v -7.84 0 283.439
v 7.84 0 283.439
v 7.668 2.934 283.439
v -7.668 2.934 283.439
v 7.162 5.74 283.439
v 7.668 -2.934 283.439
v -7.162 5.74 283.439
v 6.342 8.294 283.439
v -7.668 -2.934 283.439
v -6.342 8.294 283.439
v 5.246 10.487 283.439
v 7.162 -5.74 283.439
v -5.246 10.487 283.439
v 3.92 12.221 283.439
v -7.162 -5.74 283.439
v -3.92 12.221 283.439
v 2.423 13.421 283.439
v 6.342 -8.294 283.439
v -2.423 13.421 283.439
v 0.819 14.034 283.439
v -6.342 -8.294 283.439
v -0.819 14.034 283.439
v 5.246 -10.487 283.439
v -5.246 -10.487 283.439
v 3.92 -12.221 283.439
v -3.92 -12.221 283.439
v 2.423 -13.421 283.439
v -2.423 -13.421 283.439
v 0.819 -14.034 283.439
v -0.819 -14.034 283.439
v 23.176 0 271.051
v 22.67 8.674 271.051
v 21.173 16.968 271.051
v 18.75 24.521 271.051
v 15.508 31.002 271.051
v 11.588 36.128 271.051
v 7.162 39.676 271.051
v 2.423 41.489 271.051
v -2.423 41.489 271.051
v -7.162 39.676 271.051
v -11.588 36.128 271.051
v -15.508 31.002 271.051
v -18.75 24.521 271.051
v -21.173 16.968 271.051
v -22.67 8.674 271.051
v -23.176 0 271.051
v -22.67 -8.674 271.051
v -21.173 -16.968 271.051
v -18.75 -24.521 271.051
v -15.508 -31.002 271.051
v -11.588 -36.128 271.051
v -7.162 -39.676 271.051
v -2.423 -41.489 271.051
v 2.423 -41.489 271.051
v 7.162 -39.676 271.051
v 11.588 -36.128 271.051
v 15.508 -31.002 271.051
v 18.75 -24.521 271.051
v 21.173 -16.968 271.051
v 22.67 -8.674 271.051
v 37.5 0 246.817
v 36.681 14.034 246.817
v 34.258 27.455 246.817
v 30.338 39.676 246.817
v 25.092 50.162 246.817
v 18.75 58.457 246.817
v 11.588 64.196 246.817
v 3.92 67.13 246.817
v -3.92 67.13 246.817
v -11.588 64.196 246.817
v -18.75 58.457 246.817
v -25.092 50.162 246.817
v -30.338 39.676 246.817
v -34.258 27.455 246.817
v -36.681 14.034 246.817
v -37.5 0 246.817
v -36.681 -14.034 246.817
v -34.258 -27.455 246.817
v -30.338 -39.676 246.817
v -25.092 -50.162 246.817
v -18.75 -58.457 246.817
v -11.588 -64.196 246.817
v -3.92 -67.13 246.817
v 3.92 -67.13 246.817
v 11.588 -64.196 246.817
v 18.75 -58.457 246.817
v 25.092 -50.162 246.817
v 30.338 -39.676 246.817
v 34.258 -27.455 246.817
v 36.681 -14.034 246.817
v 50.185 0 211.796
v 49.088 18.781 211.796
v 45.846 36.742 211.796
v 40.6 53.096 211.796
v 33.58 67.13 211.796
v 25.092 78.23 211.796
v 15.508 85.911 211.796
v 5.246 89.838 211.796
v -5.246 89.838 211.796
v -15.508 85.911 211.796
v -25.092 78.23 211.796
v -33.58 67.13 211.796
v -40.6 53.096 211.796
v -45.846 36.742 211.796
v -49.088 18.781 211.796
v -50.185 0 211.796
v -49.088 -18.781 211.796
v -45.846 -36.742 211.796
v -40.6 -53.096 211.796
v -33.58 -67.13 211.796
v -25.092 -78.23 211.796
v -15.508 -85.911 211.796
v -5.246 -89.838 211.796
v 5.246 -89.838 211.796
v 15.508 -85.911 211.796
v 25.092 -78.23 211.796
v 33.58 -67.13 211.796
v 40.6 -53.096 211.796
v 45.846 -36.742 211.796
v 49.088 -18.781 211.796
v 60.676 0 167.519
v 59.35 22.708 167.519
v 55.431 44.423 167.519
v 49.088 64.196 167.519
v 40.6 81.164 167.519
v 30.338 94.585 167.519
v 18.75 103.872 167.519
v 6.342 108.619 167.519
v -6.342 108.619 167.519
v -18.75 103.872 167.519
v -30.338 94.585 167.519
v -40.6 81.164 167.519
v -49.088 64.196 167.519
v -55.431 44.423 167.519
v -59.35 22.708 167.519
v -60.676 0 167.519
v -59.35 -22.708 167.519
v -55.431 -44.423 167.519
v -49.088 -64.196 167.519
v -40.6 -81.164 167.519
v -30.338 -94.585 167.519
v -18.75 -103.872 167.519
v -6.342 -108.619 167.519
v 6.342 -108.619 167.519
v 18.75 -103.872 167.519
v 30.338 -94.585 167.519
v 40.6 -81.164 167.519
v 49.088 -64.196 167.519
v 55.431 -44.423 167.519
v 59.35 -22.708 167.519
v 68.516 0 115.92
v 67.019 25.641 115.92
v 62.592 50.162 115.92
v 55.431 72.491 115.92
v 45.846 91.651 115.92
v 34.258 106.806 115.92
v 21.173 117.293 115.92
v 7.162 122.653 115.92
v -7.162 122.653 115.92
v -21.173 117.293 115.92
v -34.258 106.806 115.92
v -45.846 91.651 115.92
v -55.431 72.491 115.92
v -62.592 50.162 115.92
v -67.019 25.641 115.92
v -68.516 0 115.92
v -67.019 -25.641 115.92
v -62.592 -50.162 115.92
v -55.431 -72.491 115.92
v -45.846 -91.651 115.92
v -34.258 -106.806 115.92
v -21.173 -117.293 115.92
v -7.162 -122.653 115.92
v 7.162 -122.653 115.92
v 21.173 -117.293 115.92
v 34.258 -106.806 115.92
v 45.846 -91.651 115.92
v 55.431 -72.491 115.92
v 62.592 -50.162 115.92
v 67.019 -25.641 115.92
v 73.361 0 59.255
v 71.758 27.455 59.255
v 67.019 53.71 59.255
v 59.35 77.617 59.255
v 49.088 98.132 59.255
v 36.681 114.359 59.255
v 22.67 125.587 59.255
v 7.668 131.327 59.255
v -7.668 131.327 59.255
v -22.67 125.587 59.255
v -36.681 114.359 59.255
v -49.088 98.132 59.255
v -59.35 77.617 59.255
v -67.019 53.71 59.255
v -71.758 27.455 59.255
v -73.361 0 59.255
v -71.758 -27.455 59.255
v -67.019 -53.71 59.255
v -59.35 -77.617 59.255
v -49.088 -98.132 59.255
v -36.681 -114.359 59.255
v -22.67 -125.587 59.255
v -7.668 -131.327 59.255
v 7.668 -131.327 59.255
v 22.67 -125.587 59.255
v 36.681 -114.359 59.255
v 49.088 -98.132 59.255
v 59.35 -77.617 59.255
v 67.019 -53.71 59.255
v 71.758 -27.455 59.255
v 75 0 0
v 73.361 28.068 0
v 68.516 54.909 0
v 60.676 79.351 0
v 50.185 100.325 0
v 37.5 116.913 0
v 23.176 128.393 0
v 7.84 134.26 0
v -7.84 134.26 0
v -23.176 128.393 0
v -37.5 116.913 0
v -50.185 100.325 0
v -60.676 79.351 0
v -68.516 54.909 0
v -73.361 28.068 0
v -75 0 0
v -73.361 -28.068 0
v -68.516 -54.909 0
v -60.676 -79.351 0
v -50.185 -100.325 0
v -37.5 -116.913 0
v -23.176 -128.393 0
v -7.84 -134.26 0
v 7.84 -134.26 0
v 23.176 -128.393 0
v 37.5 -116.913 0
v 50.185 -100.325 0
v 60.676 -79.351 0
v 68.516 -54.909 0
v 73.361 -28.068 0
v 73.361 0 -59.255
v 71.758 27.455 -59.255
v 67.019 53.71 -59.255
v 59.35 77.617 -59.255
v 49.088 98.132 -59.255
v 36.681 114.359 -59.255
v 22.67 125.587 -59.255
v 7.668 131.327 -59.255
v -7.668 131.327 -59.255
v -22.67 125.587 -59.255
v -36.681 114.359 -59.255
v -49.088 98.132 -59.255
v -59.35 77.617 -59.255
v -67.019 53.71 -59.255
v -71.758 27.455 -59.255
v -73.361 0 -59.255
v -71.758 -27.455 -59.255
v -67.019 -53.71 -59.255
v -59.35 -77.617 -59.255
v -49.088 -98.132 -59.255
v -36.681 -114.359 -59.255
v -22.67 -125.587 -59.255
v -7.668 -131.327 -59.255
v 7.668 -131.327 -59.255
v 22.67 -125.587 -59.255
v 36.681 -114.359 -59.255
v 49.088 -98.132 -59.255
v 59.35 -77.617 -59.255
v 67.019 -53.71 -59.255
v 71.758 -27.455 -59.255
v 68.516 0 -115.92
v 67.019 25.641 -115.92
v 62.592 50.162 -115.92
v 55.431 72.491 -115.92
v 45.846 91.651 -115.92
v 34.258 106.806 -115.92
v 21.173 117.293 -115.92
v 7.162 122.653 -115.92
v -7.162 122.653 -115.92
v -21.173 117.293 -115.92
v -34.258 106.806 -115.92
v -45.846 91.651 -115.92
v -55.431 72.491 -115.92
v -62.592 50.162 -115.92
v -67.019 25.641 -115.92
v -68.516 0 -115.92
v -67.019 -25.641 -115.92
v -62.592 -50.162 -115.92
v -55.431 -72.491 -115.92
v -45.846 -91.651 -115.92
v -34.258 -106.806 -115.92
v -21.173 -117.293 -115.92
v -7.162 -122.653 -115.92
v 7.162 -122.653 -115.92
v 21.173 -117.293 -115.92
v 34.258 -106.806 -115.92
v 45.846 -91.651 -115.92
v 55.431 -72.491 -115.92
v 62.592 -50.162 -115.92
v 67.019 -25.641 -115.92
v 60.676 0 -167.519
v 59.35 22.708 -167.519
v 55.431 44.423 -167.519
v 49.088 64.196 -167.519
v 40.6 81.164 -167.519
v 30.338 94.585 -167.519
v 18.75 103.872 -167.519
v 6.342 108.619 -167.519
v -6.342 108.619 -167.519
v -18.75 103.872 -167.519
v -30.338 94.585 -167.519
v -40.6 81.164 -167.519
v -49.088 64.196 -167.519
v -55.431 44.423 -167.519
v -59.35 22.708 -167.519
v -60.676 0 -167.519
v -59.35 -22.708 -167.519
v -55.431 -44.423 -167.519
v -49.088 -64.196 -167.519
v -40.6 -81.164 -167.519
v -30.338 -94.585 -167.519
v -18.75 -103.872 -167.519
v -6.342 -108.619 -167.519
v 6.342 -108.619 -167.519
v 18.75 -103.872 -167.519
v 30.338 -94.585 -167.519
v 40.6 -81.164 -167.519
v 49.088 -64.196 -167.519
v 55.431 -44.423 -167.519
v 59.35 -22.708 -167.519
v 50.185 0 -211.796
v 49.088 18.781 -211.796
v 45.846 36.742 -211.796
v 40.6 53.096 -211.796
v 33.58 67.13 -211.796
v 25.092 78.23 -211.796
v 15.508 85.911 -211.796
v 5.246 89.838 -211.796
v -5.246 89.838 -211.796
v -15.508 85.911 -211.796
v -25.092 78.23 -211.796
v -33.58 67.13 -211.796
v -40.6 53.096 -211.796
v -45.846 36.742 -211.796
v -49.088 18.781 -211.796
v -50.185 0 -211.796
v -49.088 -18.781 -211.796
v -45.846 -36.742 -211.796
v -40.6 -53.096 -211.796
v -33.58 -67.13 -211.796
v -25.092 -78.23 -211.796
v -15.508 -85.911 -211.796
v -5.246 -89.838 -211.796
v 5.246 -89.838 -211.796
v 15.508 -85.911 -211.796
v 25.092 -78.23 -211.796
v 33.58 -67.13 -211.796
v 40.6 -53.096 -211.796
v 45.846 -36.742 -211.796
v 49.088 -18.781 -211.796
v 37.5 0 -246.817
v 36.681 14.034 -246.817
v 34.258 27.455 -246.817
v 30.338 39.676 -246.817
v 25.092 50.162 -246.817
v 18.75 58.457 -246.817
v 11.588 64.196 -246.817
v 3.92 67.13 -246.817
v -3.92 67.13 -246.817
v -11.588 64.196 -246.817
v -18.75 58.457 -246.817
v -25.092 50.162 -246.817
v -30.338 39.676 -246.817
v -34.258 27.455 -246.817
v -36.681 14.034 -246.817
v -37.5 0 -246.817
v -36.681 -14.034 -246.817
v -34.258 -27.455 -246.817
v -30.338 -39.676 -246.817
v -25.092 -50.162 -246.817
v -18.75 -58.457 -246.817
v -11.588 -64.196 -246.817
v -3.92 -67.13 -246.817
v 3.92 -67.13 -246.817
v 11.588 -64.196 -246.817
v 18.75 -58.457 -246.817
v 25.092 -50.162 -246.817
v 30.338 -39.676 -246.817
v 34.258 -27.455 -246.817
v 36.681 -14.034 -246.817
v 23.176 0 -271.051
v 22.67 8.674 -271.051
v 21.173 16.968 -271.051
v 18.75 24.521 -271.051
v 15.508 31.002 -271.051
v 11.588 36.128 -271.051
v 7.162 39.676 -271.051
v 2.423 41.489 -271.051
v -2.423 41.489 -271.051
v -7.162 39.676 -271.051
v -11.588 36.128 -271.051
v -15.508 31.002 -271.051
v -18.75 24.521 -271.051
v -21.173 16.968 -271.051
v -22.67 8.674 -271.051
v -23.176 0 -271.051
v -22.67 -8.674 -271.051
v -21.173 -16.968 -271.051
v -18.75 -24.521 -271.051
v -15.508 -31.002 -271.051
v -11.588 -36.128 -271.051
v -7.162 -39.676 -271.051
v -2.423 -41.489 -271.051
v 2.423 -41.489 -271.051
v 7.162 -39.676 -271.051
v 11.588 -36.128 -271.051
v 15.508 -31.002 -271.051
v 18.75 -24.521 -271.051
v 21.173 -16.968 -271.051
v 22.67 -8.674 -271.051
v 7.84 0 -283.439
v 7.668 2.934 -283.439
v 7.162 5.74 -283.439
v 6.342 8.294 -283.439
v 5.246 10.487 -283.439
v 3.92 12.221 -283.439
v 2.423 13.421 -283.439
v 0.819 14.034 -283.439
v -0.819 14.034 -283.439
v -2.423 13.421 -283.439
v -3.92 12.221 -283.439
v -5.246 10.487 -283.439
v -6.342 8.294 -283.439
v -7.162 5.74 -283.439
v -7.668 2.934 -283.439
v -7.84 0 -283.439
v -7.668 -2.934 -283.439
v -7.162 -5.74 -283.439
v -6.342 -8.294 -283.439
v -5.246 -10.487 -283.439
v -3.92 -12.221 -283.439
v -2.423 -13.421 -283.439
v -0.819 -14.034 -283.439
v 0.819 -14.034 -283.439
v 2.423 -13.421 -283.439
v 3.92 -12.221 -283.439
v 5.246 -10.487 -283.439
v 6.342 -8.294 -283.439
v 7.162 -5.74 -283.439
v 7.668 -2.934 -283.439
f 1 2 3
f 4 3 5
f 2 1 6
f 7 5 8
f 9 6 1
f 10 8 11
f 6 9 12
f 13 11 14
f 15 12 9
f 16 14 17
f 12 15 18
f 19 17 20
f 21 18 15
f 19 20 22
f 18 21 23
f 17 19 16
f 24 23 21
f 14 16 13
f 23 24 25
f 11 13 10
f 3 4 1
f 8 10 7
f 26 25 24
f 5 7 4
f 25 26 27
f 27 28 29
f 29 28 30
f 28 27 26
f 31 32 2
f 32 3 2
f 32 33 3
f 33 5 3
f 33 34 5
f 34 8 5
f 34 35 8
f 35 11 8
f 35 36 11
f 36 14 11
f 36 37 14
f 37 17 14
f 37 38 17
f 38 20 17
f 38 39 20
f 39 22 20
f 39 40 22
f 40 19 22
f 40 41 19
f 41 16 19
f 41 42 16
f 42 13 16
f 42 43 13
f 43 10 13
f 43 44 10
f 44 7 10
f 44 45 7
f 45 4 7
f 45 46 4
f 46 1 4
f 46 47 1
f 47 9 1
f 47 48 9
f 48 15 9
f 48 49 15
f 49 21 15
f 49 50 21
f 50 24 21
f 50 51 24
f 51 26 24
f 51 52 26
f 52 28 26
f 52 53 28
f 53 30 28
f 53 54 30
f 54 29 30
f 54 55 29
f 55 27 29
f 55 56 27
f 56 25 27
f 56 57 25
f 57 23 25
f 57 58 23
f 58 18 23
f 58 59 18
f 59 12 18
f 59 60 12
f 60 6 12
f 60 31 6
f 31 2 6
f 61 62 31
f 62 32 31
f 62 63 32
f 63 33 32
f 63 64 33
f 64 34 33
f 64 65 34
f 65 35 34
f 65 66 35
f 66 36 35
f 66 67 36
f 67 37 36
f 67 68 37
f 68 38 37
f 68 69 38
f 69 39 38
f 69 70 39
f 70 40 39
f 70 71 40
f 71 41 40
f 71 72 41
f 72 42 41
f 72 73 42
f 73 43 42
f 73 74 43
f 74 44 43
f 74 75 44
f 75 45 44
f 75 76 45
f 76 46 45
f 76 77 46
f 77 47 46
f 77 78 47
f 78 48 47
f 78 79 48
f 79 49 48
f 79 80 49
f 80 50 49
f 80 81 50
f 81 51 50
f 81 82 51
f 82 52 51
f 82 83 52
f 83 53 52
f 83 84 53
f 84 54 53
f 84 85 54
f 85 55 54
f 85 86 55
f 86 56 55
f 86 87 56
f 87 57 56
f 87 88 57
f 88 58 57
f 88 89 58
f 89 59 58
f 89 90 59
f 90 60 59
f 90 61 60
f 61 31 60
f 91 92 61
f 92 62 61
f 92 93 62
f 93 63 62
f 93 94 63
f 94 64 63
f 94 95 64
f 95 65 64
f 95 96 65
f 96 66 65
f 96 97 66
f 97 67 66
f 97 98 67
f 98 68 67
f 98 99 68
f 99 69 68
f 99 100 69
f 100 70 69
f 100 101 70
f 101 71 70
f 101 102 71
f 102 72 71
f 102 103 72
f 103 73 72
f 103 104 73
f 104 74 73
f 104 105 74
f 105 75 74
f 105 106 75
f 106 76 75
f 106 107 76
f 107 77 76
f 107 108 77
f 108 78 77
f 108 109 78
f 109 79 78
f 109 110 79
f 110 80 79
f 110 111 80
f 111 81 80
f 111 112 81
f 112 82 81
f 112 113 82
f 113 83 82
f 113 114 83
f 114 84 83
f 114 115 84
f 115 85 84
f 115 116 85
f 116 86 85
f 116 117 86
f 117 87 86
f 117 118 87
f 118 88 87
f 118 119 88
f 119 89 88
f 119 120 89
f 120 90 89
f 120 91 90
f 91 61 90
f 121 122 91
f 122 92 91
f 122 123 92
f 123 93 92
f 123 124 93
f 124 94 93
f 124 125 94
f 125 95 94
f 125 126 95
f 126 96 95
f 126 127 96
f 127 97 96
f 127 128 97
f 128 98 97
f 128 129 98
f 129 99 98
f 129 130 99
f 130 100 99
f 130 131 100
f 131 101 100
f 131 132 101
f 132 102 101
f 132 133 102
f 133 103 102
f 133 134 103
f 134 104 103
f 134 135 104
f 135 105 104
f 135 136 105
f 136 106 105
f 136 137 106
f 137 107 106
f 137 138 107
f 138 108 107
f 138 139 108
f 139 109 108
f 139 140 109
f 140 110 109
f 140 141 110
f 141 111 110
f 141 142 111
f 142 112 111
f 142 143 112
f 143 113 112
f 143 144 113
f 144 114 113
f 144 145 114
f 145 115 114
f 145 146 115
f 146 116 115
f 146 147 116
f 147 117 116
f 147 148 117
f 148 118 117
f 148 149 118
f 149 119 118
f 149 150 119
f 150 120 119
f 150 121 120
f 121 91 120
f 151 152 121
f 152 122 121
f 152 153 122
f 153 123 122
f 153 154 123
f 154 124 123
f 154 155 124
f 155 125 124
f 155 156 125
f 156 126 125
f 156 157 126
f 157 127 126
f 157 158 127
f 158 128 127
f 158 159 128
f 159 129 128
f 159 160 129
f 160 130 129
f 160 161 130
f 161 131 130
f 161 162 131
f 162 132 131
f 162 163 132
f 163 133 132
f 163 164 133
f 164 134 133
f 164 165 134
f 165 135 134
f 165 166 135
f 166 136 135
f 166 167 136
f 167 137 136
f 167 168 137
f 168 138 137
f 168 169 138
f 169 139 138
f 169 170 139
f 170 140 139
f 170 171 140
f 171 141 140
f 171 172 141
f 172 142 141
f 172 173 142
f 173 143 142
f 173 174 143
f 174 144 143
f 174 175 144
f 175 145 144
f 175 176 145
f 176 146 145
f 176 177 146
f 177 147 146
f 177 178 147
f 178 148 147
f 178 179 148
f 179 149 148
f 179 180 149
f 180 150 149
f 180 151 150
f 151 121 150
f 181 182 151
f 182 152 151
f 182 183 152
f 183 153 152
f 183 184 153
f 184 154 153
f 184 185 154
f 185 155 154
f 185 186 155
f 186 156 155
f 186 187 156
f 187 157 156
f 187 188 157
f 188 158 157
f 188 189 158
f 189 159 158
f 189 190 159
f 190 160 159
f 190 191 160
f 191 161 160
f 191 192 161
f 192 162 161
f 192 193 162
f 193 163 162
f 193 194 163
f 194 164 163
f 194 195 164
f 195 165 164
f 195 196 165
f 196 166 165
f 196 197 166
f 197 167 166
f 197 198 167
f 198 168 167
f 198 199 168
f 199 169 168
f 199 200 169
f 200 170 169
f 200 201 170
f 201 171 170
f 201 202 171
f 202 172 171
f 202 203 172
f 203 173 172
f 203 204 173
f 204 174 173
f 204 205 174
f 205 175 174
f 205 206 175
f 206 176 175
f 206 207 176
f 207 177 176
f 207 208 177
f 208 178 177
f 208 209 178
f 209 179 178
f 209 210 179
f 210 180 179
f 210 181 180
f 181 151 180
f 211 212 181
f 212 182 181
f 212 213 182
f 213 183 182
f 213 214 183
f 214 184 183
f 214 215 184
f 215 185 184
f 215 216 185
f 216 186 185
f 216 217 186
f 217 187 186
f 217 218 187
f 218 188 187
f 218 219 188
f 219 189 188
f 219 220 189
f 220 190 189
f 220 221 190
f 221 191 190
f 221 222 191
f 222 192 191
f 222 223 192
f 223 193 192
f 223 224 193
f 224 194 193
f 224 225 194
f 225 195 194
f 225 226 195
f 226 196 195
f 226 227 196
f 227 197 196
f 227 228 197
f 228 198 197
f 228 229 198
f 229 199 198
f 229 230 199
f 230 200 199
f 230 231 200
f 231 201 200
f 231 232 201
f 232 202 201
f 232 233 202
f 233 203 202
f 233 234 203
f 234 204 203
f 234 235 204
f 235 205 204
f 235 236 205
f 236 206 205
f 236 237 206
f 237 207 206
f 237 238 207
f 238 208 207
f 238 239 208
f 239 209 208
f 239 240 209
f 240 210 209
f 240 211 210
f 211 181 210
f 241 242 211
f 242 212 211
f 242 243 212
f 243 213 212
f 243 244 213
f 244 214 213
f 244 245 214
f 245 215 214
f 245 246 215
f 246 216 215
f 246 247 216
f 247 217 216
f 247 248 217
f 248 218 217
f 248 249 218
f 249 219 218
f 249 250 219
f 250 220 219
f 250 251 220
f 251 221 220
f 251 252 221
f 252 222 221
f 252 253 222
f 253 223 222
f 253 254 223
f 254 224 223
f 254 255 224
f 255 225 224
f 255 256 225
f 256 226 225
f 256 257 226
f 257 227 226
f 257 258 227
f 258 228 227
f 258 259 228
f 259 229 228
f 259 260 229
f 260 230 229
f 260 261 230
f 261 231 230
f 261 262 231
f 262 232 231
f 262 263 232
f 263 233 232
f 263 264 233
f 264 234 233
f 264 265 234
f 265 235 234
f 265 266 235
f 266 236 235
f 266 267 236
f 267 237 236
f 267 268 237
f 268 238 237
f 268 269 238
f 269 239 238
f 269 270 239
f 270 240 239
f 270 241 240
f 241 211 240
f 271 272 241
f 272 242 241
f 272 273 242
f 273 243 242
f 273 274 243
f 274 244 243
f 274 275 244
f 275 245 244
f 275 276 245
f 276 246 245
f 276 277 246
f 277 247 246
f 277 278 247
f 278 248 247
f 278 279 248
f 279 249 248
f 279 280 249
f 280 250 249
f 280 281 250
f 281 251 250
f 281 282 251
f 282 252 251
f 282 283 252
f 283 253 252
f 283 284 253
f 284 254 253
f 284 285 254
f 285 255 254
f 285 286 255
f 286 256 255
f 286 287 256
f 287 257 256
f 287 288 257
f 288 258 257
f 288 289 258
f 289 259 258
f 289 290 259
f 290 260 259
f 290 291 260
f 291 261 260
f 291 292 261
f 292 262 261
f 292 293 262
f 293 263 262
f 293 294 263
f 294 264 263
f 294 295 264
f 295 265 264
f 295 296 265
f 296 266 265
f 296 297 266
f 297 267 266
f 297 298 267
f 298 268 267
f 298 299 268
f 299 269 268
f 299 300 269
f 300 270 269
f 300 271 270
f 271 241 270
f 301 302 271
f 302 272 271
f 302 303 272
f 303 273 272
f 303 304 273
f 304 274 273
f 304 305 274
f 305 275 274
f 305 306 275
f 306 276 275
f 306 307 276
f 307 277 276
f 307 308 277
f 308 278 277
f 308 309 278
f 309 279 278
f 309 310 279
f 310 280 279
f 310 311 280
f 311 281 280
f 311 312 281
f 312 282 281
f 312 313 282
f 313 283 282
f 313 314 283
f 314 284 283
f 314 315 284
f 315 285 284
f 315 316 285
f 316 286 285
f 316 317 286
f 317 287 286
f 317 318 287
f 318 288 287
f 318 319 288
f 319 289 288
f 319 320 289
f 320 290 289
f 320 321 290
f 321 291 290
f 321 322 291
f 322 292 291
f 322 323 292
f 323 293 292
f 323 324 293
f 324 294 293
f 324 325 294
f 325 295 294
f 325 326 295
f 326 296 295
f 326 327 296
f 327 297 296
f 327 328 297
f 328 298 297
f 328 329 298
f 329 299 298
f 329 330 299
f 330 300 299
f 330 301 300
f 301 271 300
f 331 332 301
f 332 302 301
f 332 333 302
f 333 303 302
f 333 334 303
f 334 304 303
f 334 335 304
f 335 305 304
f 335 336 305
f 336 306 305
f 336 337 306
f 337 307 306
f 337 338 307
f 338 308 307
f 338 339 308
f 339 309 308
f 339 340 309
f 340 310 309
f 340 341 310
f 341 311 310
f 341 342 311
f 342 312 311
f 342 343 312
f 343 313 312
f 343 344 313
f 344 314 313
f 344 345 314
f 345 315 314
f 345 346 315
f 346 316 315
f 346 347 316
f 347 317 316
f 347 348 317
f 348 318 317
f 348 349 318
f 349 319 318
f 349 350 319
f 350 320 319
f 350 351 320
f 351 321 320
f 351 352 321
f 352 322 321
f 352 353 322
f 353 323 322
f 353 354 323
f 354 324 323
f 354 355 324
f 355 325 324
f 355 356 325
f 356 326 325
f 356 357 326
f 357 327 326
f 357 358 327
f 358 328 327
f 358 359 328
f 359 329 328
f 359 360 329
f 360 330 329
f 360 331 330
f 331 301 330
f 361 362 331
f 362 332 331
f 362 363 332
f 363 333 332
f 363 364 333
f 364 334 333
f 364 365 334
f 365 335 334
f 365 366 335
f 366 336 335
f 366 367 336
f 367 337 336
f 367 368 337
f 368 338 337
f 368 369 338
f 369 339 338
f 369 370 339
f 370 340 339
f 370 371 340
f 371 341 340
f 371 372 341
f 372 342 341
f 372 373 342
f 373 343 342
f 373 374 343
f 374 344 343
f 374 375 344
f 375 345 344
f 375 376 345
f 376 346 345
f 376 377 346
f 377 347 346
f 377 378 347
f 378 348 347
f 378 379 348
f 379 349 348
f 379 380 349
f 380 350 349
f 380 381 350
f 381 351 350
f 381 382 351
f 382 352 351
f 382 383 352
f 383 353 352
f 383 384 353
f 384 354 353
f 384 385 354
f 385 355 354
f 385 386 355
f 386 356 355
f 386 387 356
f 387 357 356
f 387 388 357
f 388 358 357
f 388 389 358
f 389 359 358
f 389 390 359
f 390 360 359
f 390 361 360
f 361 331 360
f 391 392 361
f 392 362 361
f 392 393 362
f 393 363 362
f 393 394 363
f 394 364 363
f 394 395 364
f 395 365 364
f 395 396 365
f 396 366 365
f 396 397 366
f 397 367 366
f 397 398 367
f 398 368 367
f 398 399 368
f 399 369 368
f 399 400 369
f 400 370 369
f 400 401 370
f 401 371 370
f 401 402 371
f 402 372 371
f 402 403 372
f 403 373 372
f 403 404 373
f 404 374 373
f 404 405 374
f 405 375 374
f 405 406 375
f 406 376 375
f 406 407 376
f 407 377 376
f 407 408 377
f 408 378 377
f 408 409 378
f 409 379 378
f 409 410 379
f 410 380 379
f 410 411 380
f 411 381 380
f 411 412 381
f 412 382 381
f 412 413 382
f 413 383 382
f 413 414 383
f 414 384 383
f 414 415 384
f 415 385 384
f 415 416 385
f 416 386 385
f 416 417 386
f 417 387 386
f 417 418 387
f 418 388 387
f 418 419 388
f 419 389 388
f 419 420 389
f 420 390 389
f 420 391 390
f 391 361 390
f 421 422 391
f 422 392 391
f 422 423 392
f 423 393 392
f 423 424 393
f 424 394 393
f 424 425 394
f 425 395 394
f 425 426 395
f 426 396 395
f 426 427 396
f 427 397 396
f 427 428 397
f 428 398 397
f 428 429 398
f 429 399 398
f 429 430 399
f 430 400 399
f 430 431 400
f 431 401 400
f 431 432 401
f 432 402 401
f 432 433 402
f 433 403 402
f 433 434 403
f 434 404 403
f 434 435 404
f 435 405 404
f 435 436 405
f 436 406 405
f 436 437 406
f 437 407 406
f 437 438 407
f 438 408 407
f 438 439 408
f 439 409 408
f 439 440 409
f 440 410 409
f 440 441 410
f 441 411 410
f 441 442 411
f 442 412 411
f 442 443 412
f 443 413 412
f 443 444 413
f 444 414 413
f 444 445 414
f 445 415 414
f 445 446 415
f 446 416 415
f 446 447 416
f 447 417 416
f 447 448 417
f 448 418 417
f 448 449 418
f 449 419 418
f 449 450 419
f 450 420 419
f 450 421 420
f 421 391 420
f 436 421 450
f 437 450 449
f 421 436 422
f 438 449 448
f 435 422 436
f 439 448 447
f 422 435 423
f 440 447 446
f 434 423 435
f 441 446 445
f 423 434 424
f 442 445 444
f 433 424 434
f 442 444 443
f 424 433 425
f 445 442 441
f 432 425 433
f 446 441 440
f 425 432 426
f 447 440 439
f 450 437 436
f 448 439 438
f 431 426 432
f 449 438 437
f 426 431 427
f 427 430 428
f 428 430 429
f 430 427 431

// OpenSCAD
// Generated by SolidPython 1.0.1 on 2020-07-29 00:46:46


scale(v = [5, 9, 19]) {
	sphere(r = 15);
}
/***********************************************
*********      SolidPython code:      **********
************************************************
 
# import packages: SolidPython
from solid import *
from solid.utils import *
from itertools import chain, combinations, permutations


class Resize:

    def __init__(self, scad_file):
        self.scad_file = scad_file
        #self.scad_file = import_scad(scad_file)
        # cone/cylinder param:
        self.r1 = 0
        self.r2 = 0
        self.h = 0
        # rectangular prism param:
        self.w = 0
        self.l = 0
        # ellipse param:
        self.r = 0

    # import OpenScad code (file name corresponds to shape)


    # classify shape + parameters
    def assign(self, param1, param2, param3):
        if self.scad_file == 'cone.scad':
            self.r1 = param1
            self.r2 = param2
            self.h = param3
        elif self.scad_file == 'cylinder.scad':
            self.r1 = param1
            self.r2 = param2
            self.h = param3
        elif self.scad_file == 'rectangularPrism.scad':
            self.h = param1
            self.l = param2
            self.w = param3
        else:
            self.r = param1
            self.h = param2

    # resize parameters
    def iterate(self):
        x = range(3, 20, 2)
        i = 1
        if self.scad_file == 'cone.scad':
            tempList = list(permutations(x, 2))
            for temp in tempList:
                param1 = temp[0]
                param2 = temp[1]
                filepath = 'produced_scad_files/' + 'cone' + str(param1) + '_' + str(param2) + '_' + '.scad'
                scad_render_to_file(cylinder(h=param1, r1=param2, r2=0), filepath)

        elif self.scad_file == 'cylinder.scad':
            tempList = list(permutations(x, 3))
            for temp in tempList:
                param1 = temp[0]
                param2 = temp[1]
                filepath = 'produced_scad_files/' + 'cylinder' + str(param1) + '_' + str(param2) + '_' + '.scad'
                scad_render_to_file(cylinder(h=param1, r1=param2, r2=param2), filepath)

        elif self.scad_file == 'rectangularPrism.scad':
            tempList = list(permutations(x, 3))
            for temp in tempList:
                param1 = temp[0]
                param2 = temp[1]
                param3 = temp[2]
                filepath = 'produced_scad_files/' + 'rectangularPrism' + str(param1) + '_' + str(param2) + '_' + str(
                    param3) + '.scad'
                scad_render_to_file(cube(size=(param1, param2, param3)), filepath)

        elif self.scad_file == 'ellipse.scad':
            tempList = list(permutations(x, 4))
            for temp in tempList:
                param1 = temp[0]
                param2 = temp[1]
                param3 = temp[2]
                param4 = temp[3]
                filepath = 'produced_scad_files/' + 'ellipse' + str(param1) + '_' + str(param2) + '_' + str(param3) + '_' + str(param4) + '.scad'
                scad_render_to_file(scale([param1, param2, param3])(sphere(r=param4)), filepath)

    def render_to_scadfile(self):
        scad_render_to_file(scad, 'example.scad') 
 
************************************************/
